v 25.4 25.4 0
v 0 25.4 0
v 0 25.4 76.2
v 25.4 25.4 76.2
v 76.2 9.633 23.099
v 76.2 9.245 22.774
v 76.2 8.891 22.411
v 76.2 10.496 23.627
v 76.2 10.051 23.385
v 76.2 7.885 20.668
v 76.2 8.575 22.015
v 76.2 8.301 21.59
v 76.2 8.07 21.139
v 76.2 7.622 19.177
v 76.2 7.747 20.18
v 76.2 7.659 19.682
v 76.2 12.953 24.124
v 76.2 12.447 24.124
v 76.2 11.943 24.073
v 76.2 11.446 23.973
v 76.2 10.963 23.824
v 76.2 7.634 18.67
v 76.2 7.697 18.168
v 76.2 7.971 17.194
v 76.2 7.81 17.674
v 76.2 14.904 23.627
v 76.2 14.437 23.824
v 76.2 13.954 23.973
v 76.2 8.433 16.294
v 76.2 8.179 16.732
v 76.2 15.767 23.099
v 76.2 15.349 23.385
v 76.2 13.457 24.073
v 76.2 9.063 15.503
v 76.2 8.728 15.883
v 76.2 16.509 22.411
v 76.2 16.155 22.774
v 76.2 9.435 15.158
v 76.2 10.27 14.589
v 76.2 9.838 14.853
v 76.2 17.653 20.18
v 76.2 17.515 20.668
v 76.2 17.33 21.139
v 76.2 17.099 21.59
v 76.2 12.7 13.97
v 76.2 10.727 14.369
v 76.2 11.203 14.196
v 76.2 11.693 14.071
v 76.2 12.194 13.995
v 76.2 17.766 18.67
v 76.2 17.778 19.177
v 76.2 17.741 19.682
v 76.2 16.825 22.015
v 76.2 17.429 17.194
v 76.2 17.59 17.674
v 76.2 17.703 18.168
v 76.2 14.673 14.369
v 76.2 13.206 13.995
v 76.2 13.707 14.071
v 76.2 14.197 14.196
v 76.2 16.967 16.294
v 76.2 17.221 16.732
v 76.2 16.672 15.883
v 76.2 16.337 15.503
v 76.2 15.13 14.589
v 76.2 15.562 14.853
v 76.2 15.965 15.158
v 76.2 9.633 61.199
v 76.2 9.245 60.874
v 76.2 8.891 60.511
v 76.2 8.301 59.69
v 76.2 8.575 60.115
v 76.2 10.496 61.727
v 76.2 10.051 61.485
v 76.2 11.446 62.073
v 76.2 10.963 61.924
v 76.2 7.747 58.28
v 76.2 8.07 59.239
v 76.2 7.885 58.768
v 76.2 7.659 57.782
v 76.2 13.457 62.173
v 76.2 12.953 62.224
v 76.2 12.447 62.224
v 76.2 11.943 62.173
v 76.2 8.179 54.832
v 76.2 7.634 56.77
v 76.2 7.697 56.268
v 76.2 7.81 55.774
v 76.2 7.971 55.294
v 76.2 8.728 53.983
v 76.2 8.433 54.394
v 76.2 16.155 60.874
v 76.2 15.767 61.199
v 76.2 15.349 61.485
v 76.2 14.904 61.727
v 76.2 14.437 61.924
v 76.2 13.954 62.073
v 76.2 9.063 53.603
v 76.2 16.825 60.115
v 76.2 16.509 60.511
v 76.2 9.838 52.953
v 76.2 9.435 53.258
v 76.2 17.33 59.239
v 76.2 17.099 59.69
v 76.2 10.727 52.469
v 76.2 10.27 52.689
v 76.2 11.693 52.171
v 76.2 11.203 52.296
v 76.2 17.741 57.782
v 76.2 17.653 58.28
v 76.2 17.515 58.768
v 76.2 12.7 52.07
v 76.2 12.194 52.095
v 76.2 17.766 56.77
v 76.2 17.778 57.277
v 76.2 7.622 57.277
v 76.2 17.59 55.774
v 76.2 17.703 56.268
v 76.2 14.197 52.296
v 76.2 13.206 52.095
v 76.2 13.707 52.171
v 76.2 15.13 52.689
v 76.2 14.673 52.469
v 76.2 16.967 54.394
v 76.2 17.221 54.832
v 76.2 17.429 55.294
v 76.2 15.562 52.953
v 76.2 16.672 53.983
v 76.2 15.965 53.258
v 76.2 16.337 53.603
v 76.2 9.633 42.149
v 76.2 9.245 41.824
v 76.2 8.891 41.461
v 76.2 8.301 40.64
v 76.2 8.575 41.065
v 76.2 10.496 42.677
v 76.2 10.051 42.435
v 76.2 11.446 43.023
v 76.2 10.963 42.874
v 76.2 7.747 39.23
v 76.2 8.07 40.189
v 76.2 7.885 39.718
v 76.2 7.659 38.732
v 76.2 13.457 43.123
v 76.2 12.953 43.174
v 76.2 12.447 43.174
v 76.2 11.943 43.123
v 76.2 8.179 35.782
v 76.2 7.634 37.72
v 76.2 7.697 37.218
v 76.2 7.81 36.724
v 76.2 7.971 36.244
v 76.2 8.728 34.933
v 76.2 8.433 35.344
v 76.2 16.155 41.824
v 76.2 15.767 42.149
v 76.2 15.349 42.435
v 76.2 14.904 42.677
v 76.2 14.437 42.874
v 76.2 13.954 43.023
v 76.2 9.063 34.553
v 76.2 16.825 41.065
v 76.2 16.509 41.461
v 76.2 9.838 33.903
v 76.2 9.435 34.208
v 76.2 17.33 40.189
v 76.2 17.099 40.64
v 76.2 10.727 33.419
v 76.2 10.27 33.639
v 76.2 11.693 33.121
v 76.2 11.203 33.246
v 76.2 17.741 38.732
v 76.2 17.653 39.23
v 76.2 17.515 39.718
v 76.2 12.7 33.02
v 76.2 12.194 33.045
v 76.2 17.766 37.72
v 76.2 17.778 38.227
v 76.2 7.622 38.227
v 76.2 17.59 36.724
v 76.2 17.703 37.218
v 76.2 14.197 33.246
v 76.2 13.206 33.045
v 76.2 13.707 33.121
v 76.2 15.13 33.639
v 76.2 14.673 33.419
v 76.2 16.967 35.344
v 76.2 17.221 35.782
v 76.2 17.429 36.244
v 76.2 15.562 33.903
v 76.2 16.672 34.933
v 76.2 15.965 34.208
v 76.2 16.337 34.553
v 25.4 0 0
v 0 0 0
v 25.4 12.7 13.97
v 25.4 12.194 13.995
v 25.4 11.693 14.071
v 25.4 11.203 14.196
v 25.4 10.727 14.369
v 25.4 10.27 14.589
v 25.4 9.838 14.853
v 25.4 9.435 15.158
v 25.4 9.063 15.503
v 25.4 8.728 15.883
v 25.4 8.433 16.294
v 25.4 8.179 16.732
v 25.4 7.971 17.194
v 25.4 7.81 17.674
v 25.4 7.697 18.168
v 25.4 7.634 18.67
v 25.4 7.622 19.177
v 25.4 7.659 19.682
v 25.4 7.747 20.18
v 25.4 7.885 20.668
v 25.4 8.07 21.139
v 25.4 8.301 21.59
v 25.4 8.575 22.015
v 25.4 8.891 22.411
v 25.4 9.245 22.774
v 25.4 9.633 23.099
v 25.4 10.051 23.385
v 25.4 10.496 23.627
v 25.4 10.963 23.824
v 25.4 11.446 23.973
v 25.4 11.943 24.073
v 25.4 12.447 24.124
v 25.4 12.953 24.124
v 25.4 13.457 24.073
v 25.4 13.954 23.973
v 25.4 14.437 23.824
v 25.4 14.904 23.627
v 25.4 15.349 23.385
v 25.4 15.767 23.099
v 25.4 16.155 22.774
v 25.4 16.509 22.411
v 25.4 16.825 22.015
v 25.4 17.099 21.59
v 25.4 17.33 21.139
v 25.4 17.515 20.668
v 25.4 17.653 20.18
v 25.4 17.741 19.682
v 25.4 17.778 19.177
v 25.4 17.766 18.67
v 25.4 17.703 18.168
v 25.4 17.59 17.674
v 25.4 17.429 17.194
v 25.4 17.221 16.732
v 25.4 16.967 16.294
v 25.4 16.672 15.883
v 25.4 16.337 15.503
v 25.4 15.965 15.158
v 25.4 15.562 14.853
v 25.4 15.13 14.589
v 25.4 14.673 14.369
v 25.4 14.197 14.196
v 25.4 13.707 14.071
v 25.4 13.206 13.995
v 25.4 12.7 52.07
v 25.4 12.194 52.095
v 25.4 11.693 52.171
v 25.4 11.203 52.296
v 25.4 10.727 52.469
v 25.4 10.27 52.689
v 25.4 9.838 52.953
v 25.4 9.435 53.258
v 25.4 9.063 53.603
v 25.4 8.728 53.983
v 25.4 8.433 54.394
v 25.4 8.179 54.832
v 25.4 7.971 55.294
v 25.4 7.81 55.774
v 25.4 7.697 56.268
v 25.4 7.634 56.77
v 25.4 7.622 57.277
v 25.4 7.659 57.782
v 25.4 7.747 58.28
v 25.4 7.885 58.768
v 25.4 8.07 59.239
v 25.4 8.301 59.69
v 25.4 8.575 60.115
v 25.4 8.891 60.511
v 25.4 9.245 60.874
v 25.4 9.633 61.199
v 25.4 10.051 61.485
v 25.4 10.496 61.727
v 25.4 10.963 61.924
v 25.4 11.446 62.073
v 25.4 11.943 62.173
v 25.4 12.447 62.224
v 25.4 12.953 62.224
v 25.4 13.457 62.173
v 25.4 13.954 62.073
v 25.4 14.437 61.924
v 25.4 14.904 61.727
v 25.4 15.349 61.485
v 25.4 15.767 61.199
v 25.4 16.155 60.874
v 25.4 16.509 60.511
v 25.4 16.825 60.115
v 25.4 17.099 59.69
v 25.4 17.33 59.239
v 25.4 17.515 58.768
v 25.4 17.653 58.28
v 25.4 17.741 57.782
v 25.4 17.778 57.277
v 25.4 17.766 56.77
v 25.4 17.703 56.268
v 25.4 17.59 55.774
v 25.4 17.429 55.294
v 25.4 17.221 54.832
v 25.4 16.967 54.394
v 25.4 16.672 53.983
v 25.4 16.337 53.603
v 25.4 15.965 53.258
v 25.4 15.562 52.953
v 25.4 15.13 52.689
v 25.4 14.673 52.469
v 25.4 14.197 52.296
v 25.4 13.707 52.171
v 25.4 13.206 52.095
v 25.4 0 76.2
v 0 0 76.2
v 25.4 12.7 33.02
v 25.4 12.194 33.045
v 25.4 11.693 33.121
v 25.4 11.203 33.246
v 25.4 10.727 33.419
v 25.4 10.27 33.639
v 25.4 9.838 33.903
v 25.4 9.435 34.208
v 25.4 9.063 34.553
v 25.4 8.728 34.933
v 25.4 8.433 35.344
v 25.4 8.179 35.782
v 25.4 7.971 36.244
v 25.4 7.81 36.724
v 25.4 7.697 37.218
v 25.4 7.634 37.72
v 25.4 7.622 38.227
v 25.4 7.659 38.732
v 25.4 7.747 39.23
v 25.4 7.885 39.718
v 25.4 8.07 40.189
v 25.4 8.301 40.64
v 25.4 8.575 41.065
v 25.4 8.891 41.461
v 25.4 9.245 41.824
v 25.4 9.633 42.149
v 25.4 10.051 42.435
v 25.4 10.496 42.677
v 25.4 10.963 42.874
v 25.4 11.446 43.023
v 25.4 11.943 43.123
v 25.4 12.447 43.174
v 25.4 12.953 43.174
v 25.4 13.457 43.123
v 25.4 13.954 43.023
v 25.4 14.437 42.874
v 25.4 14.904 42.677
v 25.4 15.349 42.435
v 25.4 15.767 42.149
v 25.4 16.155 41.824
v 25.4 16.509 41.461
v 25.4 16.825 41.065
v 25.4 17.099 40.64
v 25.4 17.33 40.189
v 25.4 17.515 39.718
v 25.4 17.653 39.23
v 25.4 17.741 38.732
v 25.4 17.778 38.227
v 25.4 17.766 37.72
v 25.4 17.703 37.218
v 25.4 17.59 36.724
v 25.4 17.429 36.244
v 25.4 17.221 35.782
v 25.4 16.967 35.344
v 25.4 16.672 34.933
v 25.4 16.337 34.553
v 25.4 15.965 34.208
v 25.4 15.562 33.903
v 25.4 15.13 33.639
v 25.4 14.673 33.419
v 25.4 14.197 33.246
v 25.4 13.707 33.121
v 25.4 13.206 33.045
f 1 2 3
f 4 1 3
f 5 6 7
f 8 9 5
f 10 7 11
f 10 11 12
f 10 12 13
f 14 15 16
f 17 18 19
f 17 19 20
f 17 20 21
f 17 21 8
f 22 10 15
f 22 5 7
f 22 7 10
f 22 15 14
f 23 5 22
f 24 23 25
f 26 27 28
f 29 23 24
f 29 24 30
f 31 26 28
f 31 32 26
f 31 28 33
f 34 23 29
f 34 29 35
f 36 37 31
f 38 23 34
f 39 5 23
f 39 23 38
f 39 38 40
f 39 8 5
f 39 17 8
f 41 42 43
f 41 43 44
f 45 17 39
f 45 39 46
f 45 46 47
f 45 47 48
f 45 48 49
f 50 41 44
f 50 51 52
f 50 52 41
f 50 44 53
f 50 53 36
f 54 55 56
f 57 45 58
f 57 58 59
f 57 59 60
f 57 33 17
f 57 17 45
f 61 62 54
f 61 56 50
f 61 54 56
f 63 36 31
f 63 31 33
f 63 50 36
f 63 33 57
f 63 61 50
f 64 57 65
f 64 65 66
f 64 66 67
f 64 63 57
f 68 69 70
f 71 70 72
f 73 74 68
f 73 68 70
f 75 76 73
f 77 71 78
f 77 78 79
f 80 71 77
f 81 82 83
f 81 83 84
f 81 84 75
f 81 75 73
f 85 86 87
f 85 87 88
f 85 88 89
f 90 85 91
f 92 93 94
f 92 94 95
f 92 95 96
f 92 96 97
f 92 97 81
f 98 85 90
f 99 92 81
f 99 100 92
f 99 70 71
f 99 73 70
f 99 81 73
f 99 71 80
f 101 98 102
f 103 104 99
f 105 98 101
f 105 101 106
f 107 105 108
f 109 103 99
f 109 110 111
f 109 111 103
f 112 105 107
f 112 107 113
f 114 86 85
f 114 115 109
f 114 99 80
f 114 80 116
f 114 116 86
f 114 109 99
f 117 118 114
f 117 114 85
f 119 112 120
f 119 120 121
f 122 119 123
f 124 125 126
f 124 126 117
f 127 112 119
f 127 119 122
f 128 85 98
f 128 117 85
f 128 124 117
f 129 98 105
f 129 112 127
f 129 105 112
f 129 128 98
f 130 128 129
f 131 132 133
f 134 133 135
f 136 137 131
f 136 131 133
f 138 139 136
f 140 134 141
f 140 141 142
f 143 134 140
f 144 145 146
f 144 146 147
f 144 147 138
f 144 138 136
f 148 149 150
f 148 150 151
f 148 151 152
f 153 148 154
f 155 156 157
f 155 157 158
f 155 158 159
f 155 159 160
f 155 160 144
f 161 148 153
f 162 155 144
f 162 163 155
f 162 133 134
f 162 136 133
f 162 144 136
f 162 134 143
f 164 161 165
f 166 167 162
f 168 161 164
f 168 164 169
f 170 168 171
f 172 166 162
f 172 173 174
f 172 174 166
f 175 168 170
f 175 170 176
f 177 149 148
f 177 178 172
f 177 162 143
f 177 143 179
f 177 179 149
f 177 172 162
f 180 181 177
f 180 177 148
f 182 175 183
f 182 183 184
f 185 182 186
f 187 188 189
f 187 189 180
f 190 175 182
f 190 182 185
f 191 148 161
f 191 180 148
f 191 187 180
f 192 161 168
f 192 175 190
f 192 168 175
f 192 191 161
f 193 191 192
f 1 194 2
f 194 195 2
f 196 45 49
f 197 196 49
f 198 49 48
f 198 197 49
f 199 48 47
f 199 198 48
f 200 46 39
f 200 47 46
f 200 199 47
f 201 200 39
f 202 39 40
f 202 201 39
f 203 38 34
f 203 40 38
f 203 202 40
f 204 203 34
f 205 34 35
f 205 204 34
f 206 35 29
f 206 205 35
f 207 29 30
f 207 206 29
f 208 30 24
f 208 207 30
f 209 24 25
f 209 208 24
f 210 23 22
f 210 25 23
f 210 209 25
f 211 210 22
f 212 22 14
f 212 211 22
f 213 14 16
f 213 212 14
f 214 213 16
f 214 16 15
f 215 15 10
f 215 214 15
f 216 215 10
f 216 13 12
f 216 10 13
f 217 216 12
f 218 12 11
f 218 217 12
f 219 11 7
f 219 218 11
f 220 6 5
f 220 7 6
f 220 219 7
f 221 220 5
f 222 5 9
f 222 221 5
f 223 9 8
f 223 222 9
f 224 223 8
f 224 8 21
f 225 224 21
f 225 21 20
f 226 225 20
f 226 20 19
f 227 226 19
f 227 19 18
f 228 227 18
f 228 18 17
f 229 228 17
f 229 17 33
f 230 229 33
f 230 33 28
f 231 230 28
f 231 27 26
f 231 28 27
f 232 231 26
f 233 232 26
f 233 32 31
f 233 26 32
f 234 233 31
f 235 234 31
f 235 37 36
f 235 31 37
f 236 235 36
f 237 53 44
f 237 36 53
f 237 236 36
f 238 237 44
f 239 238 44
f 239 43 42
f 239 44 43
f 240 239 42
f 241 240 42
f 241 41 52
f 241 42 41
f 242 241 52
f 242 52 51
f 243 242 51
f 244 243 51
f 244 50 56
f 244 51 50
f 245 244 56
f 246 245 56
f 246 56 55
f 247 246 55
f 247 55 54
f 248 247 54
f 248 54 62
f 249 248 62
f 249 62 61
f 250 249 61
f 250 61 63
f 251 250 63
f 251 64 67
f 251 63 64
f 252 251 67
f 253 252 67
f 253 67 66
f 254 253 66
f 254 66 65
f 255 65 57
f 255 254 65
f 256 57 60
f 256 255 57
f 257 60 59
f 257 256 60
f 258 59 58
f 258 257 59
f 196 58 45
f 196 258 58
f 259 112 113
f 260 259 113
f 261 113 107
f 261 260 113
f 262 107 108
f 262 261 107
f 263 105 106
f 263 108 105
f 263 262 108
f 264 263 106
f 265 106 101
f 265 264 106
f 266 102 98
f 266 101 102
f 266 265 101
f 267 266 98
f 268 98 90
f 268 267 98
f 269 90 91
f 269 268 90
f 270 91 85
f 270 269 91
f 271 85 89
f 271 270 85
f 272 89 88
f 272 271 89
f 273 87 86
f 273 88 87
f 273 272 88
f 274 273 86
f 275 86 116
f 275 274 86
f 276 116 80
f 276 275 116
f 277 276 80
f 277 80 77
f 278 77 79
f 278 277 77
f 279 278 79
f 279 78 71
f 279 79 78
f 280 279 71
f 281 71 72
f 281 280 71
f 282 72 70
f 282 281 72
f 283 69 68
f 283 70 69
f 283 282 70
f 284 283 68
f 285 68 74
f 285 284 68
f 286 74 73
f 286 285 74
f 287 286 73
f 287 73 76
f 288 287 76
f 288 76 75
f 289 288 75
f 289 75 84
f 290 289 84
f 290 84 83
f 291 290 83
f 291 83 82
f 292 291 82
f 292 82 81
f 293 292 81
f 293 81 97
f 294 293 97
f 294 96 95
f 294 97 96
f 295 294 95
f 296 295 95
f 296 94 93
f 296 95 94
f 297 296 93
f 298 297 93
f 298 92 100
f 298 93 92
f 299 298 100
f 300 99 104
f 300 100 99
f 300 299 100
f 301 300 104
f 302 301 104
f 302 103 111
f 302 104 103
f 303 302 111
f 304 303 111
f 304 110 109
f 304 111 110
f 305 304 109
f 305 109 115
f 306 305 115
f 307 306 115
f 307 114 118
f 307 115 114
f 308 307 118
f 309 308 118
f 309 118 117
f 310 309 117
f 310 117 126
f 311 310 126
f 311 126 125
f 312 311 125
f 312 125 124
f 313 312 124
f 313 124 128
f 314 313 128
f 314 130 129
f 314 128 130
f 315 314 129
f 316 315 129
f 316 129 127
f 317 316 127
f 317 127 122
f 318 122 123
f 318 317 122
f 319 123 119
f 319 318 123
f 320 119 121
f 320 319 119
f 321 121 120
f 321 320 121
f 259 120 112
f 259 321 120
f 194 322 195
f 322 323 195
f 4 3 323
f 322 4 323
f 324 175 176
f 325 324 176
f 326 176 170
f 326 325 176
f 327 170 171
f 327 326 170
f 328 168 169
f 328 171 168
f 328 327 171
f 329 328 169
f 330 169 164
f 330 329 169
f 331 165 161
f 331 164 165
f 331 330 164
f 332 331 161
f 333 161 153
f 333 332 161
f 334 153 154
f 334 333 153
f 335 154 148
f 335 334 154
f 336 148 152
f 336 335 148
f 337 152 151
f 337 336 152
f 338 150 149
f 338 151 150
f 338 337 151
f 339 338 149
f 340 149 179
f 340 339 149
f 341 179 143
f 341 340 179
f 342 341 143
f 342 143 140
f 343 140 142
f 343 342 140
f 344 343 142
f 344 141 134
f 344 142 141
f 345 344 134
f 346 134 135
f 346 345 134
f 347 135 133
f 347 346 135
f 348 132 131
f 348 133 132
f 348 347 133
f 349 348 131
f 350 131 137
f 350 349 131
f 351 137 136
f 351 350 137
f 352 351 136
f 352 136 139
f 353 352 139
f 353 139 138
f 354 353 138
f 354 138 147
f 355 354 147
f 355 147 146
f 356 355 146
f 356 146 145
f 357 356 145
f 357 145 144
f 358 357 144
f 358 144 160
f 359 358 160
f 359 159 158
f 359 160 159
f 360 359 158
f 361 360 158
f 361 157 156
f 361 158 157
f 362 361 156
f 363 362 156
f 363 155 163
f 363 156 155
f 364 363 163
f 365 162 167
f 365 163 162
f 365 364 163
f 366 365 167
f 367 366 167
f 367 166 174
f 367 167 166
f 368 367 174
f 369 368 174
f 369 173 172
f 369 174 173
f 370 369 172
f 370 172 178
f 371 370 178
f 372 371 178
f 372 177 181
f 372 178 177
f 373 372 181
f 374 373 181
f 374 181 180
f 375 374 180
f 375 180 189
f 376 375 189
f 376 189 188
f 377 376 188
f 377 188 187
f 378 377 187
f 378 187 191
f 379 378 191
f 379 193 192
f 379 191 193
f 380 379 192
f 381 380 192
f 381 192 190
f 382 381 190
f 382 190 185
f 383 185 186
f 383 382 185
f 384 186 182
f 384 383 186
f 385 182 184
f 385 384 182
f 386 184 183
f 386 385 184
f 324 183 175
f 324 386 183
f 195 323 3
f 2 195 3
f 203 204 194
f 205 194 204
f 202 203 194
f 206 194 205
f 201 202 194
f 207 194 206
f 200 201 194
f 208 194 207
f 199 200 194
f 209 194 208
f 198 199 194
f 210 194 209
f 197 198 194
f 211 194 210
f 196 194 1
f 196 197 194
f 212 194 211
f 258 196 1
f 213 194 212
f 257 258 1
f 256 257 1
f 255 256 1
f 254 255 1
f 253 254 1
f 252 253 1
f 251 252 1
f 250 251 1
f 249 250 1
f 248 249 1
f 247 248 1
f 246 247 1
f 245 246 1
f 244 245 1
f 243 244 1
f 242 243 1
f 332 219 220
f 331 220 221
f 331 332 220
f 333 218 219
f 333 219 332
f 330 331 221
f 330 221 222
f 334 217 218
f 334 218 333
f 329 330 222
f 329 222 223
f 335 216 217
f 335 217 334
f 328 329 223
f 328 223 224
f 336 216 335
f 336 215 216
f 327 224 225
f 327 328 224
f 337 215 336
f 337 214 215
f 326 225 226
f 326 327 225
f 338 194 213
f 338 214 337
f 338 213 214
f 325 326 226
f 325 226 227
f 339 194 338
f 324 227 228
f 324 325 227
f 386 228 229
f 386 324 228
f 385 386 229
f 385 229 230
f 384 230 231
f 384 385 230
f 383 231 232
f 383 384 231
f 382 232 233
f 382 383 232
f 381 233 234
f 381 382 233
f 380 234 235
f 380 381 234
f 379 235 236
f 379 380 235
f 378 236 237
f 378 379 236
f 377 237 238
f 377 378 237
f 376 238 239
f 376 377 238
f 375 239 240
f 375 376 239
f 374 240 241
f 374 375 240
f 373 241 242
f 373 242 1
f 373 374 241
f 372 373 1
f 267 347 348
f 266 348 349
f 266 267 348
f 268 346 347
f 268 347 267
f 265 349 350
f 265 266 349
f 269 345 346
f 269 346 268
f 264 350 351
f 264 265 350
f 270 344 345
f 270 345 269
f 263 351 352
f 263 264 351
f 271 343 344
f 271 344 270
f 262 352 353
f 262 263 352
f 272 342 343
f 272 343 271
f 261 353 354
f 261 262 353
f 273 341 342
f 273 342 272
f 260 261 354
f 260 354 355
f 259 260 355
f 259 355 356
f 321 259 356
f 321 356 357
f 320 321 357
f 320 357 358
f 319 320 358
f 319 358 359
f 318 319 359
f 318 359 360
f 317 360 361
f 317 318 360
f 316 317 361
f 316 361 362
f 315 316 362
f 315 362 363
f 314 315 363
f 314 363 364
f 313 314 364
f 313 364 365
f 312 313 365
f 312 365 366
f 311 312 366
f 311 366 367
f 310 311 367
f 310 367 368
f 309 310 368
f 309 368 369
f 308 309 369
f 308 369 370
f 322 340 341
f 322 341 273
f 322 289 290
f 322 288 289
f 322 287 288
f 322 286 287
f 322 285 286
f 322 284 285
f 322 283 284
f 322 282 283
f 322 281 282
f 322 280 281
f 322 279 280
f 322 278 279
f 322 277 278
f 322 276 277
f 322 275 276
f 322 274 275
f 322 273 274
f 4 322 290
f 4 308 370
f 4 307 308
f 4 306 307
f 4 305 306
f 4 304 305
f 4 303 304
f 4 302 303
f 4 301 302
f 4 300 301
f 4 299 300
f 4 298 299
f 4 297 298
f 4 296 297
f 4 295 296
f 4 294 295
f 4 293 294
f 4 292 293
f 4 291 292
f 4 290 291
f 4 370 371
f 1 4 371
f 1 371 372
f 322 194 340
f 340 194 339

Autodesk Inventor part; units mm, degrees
ref_plane "YZ Plane" through (0, 0, 0) normal (1, 0, 0) x (0, 1, 0)
ref_plane "XZ Plane" through (0, 0, 0) normal (0, 1, 0) x (-1, 0, 0)
ref_plane "XY Plane" through (0, 0, 0) normal (0, 0, 1) x (1, 0, 0)
sketch "Sketch1" plane through (0, 0, 0) normal (1, 0, 0) x (0, 1, 0)
  line L0 (0, 0) -> (25.4, 0)
  line L1 (25.4, 0) -> (25.4, 76.2)
  line L2 (25.4, 76.2) -> (0, 76.2)
  line L3 (0, 76.2) -> (0, 0)
  dimension "d2" = 25.4
  dimension "d3" = 76.2
extrude "Extrusion1" add sketch "Sketch1" along normal blind 25.4
sketch "Sketch2" plane through (25.4, 0, 0) normal (1, 0, 0) x (0, 0, -1)
  circle A0 centre (-717.1181, 162.0804) radius 50.8
  circle A1 centre (-57.15, 12.7) radius 5.08
  circle A2 centre (-38.1, 12.7) radius 5.08
  circle A3 centre (-19.05, 12.7) radius 5.08
  line L0 (0, 25.4) -> (-76.2, 25.4) projected
  line L1 (-76.2, 0) -> (0, 0) projected
  line L2 (-76.2, 25.4) -> (-76.2, 0) projected
  line L3 (0, 0) -> (0, 25.4) projected
  dimension "d6" = 101.6
  dimension "d15" = 10.16
  dimension "d16" = 10.16
  dimension "d17" = 10.16
  dimension "d18" = 25.4
  dimension "d19" = 12.7
  dimension "d21" = 76.2
  dimension "d22" = 38.1
  dimension "d23" = 19.05
  dimension "d24" = 25.4
  dimension "d26" = 19.05
  dimension "d27" = 12.7
extrude "Extrusion2" add sketch "Sketch2" along normal blind 50.8 contours A1 | A2 | A3
equation "\"d16\" = d15"
equation "\"d17\" = d15"
equation "\"d19\" = 0.5 * d18"
equation "\"d22\" = 0.5 * d21"
equation "\"d23\" = 0.5 * d22"
equation "\"d26\" = d23"
equation "\"d27\" = d19"
